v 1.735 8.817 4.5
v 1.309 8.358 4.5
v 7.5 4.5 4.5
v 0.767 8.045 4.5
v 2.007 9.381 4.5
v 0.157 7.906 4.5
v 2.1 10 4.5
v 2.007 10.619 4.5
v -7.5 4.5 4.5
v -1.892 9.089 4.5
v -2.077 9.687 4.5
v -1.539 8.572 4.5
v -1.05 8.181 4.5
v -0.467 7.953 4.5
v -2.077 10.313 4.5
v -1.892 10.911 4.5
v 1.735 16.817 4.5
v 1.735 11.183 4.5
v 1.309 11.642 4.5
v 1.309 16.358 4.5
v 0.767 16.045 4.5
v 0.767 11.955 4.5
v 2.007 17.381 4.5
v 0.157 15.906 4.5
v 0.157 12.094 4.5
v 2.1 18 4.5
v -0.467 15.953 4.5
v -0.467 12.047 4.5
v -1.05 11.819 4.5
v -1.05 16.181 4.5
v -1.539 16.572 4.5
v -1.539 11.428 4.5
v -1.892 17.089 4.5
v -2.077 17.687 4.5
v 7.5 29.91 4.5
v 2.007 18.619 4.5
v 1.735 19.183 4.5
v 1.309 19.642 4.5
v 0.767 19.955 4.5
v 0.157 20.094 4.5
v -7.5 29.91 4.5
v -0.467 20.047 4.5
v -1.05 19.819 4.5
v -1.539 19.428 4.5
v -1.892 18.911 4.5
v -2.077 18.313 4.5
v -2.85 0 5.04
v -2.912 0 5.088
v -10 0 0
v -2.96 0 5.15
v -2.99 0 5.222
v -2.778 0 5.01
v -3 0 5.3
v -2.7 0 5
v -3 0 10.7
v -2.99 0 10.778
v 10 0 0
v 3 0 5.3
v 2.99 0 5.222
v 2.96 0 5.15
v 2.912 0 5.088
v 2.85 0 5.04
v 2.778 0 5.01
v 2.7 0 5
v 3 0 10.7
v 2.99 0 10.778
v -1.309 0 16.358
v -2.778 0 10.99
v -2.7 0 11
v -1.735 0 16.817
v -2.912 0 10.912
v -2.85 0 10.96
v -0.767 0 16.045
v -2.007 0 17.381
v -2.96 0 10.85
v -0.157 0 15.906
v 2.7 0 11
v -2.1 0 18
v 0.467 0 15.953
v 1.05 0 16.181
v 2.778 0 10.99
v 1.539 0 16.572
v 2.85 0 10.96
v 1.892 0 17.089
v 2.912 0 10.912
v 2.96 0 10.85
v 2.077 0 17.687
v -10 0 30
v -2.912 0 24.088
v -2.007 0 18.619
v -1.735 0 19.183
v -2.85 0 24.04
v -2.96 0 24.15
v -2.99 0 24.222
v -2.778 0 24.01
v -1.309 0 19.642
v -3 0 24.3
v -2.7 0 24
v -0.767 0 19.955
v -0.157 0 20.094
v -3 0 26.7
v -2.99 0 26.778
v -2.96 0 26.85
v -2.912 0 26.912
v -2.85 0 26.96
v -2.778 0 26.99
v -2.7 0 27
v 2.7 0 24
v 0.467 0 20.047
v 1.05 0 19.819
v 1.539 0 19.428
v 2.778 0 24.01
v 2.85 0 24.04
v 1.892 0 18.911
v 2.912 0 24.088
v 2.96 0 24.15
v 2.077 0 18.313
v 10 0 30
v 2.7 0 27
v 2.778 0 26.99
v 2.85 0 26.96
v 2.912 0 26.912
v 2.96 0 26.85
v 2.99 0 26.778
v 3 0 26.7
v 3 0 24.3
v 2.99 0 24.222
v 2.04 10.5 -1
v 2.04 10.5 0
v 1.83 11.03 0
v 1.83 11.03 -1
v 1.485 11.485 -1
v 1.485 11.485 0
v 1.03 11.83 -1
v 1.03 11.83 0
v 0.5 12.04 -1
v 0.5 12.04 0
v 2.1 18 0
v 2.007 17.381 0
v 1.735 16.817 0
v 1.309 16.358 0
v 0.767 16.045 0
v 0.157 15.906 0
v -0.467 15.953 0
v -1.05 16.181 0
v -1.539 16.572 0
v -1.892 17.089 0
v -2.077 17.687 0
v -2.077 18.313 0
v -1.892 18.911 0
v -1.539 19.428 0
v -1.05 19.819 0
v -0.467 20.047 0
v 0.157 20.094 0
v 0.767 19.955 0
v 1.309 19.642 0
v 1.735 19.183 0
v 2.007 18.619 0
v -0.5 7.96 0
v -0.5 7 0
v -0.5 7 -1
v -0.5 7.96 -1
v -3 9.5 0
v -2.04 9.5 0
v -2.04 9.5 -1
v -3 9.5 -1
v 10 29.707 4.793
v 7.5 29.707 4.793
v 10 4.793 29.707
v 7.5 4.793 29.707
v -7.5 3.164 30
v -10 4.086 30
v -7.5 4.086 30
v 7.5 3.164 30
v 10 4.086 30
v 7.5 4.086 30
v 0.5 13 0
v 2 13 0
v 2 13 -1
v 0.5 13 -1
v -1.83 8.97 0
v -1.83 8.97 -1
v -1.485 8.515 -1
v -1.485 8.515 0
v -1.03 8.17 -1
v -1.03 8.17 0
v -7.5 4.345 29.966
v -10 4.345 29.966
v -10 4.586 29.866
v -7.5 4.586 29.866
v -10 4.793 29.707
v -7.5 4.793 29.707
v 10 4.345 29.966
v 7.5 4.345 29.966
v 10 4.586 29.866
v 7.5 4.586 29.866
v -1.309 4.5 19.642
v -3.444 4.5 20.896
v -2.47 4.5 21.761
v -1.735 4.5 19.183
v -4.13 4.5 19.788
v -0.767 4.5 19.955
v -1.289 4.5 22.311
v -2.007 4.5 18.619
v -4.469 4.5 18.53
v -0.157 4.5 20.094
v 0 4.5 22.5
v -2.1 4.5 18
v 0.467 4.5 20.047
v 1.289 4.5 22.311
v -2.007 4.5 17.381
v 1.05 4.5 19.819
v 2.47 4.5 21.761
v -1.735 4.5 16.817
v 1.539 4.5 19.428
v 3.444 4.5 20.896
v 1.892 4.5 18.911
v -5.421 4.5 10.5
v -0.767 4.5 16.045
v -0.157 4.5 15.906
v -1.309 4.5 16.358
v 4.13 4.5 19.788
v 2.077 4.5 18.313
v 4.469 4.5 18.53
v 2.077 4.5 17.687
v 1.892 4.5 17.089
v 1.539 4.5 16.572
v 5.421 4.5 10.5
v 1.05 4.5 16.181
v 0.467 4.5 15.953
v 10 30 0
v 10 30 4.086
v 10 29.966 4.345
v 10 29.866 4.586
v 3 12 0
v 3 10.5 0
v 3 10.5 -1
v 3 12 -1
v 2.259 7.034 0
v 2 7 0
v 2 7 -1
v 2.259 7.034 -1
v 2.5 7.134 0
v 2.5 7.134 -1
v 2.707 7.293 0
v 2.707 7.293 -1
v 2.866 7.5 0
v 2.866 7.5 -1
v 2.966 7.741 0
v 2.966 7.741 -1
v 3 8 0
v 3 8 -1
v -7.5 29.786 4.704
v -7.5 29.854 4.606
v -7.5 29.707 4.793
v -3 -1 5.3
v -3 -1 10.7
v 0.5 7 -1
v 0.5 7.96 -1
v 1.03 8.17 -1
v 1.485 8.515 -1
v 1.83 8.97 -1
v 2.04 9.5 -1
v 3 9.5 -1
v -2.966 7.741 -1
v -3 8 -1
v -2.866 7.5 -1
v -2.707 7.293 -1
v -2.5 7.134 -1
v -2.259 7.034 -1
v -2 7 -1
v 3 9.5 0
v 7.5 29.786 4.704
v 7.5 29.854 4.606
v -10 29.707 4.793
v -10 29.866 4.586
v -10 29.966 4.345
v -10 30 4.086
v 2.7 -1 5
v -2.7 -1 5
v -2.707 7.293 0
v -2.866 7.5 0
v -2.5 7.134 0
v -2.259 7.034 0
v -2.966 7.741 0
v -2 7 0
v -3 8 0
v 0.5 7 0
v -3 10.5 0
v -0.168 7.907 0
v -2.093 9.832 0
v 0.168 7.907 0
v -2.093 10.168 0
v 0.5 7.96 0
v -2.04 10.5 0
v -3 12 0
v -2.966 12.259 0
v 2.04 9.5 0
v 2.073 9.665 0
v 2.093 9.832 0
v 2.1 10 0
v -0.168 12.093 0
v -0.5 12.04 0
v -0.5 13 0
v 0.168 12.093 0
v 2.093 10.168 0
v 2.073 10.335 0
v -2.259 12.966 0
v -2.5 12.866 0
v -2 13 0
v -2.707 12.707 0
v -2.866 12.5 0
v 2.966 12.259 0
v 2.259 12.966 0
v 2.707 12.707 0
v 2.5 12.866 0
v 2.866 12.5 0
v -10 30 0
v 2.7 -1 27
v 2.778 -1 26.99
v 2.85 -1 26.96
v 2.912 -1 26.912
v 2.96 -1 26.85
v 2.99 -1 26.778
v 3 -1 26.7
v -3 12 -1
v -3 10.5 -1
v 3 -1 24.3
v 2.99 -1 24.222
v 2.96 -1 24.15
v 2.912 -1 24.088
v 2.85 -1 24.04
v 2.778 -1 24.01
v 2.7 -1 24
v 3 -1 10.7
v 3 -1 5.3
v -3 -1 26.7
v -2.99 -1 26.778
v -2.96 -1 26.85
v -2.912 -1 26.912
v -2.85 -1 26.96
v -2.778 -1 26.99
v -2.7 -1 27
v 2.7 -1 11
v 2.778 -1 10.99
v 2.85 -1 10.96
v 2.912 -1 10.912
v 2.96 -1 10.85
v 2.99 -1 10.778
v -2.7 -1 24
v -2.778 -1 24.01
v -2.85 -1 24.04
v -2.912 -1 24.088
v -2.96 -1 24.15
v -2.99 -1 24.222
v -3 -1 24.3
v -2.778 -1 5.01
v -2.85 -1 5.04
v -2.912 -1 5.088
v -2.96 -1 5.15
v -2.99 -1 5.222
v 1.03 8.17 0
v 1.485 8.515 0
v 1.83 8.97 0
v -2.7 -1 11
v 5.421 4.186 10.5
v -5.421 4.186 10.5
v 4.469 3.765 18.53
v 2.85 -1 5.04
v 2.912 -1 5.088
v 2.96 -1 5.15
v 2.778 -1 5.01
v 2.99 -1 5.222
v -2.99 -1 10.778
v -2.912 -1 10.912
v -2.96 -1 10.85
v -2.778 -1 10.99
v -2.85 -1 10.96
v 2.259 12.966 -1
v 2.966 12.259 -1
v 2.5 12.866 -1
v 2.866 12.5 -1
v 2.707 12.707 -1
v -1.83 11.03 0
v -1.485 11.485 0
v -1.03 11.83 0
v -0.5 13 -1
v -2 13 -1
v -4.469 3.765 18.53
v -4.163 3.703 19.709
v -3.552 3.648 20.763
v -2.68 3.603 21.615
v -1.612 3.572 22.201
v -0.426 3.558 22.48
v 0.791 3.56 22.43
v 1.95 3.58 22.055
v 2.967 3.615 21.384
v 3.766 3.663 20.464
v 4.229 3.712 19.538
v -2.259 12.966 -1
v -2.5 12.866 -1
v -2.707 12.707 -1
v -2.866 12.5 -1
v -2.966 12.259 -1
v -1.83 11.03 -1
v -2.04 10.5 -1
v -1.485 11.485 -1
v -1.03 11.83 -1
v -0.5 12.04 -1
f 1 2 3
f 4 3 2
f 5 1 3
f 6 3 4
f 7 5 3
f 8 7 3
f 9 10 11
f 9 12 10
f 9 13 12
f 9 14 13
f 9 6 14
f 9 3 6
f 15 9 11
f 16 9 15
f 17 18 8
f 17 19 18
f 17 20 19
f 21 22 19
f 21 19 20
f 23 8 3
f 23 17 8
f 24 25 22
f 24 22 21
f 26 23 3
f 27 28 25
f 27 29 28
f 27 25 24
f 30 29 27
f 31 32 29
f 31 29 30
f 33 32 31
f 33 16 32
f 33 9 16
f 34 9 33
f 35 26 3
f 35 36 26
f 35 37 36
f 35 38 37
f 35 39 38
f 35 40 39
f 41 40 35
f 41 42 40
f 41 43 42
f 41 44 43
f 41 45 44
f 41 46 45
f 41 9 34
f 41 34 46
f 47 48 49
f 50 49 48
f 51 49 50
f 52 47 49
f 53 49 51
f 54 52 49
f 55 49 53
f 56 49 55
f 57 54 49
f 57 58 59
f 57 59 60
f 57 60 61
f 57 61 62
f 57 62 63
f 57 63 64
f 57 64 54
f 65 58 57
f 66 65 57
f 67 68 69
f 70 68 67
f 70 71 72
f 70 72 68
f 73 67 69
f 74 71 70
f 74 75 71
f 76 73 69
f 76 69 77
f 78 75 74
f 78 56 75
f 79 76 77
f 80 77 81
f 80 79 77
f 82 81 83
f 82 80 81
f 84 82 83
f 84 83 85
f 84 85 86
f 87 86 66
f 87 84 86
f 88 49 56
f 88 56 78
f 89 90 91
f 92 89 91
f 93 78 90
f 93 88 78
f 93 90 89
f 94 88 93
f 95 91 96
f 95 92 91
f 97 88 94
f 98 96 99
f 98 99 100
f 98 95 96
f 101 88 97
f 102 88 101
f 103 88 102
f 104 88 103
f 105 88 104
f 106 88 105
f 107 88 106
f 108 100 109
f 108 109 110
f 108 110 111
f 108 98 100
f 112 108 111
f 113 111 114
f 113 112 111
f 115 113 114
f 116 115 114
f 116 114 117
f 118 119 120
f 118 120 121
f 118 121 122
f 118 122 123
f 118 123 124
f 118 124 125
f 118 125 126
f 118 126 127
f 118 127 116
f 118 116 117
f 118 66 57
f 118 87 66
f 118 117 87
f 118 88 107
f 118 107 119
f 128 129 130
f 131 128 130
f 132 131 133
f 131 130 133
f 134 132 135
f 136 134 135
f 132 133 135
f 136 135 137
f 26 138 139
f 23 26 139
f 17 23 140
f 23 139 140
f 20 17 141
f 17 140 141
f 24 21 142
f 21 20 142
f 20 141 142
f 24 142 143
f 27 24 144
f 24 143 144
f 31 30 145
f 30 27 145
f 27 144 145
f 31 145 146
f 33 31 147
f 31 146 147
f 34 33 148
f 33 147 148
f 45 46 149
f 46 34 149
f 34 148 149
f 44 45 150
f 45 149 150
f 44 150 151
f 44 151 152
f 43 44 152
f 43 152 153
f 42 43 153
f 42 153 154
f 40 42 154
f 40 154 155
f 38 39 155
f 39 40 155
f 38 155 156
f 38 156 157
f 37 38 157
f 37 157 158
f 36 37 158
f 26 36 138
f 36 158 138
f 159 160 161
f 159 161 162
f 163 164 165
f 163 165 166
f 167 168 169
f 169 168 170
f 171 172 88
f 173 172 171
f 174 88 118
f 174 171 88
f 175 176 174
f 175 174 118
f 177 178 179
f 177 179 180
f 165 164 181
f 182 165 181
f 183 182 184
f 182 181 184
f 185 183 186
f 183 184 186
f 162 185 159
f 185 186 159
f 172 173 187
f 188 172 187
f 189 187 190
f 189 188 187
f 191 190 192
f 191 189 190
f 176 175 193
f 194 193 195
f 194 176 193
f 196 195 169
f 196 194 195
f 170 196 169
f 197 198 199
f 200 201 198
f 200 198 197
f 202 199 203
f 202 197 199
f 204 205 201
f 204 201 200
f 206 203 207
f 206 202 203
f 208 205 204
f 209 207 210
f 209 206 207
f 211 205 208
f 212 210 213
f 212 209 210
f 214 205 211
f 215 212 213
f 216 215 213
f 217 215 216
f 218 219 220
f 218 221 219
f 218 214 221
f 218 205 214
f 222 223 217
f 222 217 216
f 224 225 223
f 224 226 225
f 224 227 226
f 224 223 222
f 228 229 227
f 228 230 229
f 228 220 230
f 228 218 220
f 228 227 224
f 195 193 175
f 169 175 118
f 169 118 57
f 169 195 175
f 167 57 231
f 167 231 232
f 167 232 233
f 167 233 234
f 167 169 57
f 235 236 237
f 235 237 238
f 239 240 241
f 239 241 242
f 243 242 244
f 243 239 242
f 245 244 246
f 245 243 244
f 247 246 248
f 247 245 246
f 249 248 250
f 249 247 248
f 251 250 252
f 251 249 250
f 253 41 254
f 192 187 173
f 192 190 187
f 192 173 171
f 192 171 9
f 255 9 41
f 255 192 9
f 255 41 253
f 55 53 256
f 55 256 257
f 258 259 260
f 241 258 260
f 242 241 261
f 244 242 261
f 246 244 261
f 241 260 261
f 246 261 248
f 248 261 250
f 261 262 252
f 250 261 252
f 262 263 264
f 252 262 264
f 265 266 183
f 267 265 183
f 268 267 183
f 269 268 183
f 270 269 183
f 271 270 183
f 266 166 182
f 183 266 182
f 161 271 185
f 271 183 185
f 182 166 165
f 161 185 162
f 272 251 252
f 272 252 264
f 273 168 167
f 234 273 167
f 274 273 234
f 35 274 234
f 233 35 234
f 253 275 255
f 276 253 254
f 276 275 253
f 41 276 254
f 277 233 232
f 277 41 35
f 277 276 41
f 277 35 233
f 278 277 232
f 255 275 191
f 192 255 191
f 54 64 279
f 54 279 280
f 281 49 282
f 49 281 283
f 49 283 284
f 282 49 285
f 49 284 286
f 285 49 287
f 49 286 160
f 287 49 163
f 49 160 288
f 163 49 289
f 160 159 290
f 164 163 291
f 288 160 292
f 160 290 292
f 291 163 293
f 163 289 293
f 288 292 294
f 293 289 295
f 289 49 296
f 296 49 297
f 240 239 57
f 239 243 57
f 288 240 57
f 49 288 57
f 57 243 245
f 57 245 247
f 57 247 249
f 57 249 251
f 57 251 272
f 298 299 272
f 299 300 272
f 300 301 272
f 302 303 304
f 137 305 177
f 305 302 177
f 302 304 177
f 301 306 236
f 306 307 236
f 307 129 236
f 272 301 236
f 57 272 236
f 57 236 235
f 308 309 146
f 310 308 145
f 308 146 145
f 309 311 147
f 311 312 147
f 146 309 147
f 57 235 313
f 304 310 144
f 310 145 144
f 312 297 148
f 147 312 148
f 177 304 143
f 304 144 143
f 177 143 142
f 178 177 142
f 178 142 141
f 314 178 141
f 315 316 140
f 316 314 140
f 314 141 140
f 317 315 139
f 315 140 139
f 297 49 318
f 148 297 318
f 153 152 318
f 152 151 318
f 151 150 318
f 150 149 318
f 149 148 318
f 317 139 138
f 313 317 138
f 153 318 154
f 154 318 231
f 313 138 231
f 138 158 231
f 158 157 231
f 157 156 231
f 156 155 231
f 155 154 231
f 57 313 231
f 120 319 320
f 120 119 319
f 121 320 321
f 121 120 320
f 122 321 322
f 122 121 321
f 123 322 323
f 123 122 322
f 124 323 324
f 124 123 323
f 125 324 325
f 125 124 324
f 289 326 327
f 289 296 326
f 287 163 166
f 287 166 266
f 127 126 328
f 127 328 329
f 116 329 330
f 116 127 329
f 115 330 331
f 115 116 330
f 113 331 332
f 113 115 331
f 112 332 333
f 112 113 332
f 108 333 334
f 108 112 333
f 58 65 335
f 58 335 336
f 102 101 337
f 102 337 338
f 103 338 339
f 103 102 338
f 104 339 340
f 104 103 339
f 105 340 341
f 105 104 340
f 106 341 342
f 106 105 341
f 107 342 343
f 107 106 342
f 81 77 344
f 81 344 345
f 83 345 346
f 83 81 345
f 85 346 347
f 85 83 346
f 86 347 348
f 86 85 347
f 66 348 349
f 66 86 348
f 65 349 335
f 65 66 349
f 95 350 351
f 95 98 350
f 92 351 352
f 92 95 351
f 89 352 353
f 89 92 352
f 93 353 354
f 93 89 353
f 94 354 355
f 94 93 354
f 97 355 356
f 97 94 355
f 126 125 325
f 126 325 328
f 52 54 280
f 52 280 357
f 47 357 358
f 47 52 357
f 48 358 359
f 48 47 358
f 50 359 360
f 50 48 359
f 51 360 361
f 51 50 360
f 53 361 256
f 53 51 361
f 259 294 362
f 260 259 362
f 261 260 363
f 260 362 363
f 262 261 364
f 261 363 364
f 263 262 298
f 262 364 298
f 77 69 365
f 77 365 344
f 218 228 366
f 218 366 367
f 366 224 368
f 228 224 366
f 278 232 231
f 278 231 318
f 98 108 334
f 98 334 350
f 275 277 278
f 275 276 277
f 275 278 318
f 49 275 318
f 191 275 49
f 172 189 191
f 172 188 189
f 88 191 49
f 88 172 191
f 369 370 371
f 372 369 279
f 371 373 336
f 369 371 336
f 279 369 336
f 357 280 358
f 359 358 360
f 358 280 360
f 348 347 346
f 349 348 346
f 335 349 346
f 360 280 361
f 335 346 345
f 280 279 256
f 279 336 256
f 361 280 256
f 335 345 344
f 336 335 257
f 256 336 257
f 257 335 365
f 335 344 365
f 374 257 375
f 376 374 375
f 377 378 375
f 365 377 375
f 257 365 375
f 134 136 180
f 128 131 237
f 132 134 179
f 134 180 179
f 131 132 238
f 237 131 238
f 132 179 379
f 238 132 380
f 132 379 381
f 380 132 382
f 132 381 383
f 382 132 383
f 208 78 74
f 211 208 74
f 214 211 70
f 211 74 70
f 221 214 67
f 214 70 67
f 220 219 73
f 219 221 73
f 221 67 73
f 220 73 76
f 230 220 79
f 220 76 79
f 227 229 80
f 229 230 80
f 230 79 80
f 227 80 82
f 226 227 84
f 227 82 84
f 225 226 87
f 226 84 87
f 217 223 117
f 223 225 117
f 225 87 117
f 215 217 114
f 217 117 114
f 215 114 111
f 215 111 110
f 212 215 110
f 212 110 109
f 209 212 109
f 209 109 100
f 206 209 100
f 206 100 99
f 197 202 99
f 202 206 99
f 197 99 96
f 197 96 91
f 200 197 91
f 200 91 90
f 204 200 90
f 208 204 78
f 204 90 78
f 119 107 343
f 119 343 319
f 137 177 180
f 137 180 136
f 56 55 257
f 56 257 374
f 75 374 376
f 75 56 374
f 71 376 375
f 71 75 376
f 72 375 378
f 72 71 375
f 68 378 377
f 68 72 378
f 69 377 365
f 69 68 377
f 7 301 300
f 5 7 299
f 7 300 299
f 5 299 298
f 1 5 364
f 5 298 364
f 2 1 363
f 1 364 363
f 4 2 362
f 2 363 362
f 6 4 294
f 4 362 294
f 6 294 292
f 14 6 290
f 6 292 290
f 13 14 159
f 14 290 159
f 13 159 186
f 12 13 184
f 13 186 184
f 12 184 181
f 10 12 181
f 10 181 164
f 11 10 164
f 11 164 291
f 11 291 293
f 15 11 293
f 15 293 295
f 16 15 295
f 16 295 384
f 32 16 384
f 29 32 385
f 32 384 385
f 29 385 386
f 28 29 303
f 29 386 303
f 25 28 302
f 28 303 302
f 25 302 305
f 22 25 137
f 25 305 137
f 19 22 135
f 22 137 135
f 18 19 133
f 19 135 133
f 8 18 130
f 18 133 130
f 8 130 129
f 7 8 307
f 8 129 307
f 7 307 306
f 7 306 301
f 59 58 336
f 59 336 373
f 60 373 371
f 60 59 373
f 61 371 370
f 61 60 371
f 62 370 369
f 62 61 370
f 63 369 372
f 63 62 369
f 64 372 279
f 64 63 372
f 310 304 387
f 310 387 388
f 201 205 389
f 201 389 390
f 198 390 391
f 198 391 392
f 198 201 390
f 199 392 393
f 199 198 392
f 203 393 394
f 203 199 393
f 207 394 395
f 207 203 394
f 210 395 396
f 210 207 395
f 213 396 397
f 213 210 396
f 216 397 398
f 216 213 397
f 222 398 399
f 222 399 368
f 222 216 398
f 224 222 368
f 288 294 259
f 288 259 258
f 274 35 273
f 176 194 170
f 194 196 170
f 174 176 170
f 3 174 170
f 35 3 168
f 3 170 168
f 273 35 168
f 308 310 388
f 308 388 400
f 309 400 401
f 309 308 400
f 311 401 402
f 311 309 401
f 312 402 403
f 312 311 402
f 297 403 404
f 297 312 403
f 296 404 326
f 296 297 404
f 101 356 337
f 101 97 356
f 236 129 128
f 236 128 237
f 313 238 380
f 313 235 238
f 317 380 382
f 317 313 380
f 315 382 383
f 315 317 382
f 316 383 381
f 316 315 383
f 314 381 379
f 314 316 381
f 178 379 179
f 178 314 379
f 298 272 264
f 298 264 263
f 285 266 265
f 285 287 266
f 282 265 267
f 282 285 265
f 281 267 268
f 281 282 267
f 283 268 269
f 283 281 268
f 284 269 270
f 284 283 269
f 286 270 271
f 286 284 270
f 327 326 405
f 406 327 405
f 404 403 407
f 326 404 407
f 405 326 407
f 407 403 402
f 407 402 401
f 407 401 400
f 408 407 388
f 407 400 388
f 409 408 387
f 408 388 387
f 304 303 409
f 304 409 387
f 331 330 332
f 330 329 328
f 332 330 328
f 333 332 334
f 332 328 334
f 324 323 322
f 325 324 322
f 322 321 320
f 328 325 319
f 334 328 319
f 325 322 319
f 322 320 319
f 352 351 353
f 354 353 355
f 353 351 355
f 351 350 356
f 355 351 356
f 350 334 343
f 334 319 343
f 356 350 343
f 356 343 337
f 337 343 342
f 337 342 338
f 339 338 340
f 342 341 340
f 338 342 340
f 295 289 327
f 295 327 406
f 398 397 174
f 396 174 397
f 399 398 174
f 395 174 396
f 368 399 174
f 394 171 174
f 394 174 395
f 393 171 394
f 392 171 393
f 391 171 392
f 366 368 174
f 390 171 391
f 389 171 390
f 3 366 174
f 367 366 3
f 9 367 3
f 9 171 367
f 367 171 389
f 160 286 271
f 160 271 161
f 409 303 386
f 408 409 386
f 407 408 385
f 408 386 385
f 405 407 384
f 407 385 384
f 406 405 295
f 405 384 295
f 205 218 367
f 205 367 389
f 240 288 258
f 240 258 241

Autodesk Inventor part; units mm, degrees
ref_plane "YZ Plane" through (0, 0, 0) normal (1, 0, 0) x (0, 1, 0)
ref_plane "XZ Plane" through (0, 0, 0) normal (0, 1, 0) x (-1, 0, 0)
ref_plane "XY Plane" through (0, 0, 0) normal (0, 0, 1) x (1, 0, 0)
sketch "Sketch_15" plane through (0, 0, 0) normal (1, 0, 0) x (0, 1, 0)
  line L0 (0, 30) -> (0, 0)
  line L1 (0, 0) -> (30, 0)
  line L2 (30, 0) -> (30, 4.0858)
  arc A0 (30, 4.0858) -> (29.7071, 4.7929) centre (29, 4.0858) ccw
  line L3 (29.7071, 4.7929) -> (4.7929, 29.7071)
  arc A1 (4.7929, 29.7071) -> (4.0858, 30) centre (4.0858, 29) ccw
  line L4 (4.0858, 30) -> (0, 30)
extrude "Extrusion1" add sketch "Sketch_15" along normal mid plane 20
sketch "Sketch_16" plane through (0, 0, 0) normal (1, 0, 0) x (0, 1, 0)
  line L0 (2.9278, 34.5) -> (4.5, 4.5)
  line L1 (4.5, 4.5) -> (34.5, 4.5)
  line L2 (34.5, 4.5) -> (34.5, 34.5)
  line L3 (34.5, 34.5) -> (2.9278, 34.5)
extrude "Extrusion2" cut sketch "Sketch_16" along normal mid plane 15
sketch "Sketch_17" plane through (0, 4.5, 0) normal (0, 1, 0) x (1, 0, 0)
  line L0 (-5.4209, -10.5) -> (-4.4687, -18.5299)
  arc A0 (-4.4687, -18.5299) -> (4.4687, -18.5299) centre (0, -18) ccw
  line L1 (4.4687, -18.5299) -> (5.4209, -10.5)
  line L2 (5.4209, -10.5) -> (-5.4209, -10.5)
extrude "Extrusion3" add sketch "Sketch_17" against normal blind 2.25
sketch "Sketch_2" plane through (0, 0, 0) normal (0, 0, 1) x (1, 0, 0)
  circle A0 centre (0, 18) radius 2.1
extrude "Extrusion4" cut sketch "Sketch_2" along normal blind 4.5
sketch "Sketch_9" plane through (0, 0, 0) normal (0, 0, 1) x (1, 0, 0)
  circle A0 centre (0, 10) radius 2.1
extrude "Extrusion5" cut sketch "Sketch_9" along normal blind 4.5
sketch "Sketch_3" plane through (0, 0, 0) normal (0, 1, 0) x (-1, 0, 0)
  circle A0 centre (0, 18) radius 2.1
extrude "Extrusion6" cut sketch "Sketch_3" along normal blind 4.5
sketch "Sketch_1" plane through (0, 0, 0) normal (0, 1, 0) x (-1, 0, 0)
  line L0 (10, 0) -> (10, 30)
  line L1 (10, 30) -> (-10, 30)
  line L2 (-10, 30) -> (-10, 0)
  line L3 (-10, 0) -> (10, 0)
extrude "Extrusion7" add sketch "Sketch_1" against normal blind 1
sketch "Sketch_4" plane through (0, 0, 0) normal (0, 1, 0) x (-1, 0, 0)
  line L0 (10, 0) -> (10, 30)
  line L1 (10, 30) -> (-10, 30)
  line L2 (-10, 30) -> (-10, 0)
  line L3 (-10, 0) -> (10, 0)
  arc A0 (3, 10.7) -> (2.7, 11) centre (2.7, 10.7) ccw
  line L4 (2.7, 11) -> (-2.7, 11)
  arc A1 (-2.7, 11) -> (-3, 10.7) centre (-2.7, 10.7) ccw
  line L5 (-3, 10.7) -> (-3, 5.3)
  arc A2 (-3, 5.3) -> (-2.7, 5) centre (-2.7, 5.3) ccw
  line L6 (-2.7, 5) -> (2.7, 5)
  arc A3 (2.7, 5) -> (3, 5.3) centre (2.7, 5.3) ccw
  line L7 (3, 5.3) -> (3, 10.7)
  arc A4 (3, 26.7) -> (2.7, 27) centre (2.7, 26.7) ccw
  line L8 (2.7, 27) -> (-2.7, 27)
  arc A5 (-2.7, 27) -> (-3, 26.7) centre (-2.7, 26.7) ccw
  line L9 (-3, 26.7) -> (-3, 24.3)
  arc A6 (-3, 24.3) -> (-2.7, 24) centre (-2.7, 24.3) ccw
  line L10 (-2.7, 24) -> (2.7, 24)
  arc A7 (2.7, 24) -> (3, 24.3) centre (2.7, 24.3) ccw
  line L11 (3, 24.3) -> (3, 26.7)
extrude "Extrusion8" cut sketch "Sketch_4" against normal blind 1
sketch "Sketch_10" plane through (0, 0, 0) normal (0, 0, 1) x (1, 0, 0)
  line L0 (-10, 0) -> (10, 0)
  line L1 (10, 0) -> (10, 30)
  line L2 (10, 30) -> (-10, 30)
  line L3 (-10, 30) -> (-10, 0)
extrude "Extrusion9" add sketch "Sketch_10" against normal blind 1
sketch "Sketch_11" plane through (0, 0, 0) normal (0, 0, 1) x (1, 0, 0)
  line L0 (-10, 0) -> (10, 0)
  line L1 (10, 0) -> (10, 30)
  line L2 (10, 30) -> (-10, 30)
  line L3 (-10, 30) -> (-10, 0)
  line L4 (0.5, 7) -> (2, 7)
  arc A0 (2, 7) -> (3, 8) centre (2, 8) ccw
  line L5 (3, 8) -> (3, 9.5)
  line L6 (3, 9.5) -> (2.0396, 9.5)
  arc A1 (0.5, 7.9604) -> (2.0396, 9.5) centre (0, 10) ccw
  line L7 (0.5, 7.9604) -> (0.5, 7)
  line L8 (0.5, 13) -> (0.5, 12.0396)
  arc A2 (2.0396, 10.5) -> (0.5, 12.0396) centre (0, 10) ccw
  line L9 (2.0396, 10.5) -> (3, 10.5)
  line L10 (3, 10.5) -> (3, 12)
  arc A3 (3, 12) -> (2, 13) centre (2, 12) ccw
  line L11 (2, 13) -> (0.5, 13)
  line L12 (-3, 9.5) -> (-3, 8)
  arc A4 (-3, 8) -> (-2, 7) centre (-2, 8) ccw
  line L13 (-2, 7) -> (-0.5, 7)
  line L14 (-0.5, 7) -> (-0.5, 7.9604)
  arc A5 (-2.0396, 9.5) -> (-0.5, 7.9604) centre (0, 10) ccw
  line L15 (-2.0396, 9.5) -> (-3, 9.5)
  line L16 (-3, 10.5) -> (-2.0396, 10.5)
  arc A6 (-0.5, 12.0396) -> (-2.0396, 10.5) centre (0, 10) ccw
  line L17 (-0.5, 12.0396) -> (-0.5, 13)
  line L18 (-0.5, 13) -> (-2, 13)
  arc A7 (-2, 13) -> (-3, 12) centre (-2, 12) ccw
  line L19 (-3, 12) -> (-3, 10.5)
extrude "Extrusion10" cut sketch "Sketch_11" against normal blind 1
properties part number "HBLFSN5-4hblfsn5"
